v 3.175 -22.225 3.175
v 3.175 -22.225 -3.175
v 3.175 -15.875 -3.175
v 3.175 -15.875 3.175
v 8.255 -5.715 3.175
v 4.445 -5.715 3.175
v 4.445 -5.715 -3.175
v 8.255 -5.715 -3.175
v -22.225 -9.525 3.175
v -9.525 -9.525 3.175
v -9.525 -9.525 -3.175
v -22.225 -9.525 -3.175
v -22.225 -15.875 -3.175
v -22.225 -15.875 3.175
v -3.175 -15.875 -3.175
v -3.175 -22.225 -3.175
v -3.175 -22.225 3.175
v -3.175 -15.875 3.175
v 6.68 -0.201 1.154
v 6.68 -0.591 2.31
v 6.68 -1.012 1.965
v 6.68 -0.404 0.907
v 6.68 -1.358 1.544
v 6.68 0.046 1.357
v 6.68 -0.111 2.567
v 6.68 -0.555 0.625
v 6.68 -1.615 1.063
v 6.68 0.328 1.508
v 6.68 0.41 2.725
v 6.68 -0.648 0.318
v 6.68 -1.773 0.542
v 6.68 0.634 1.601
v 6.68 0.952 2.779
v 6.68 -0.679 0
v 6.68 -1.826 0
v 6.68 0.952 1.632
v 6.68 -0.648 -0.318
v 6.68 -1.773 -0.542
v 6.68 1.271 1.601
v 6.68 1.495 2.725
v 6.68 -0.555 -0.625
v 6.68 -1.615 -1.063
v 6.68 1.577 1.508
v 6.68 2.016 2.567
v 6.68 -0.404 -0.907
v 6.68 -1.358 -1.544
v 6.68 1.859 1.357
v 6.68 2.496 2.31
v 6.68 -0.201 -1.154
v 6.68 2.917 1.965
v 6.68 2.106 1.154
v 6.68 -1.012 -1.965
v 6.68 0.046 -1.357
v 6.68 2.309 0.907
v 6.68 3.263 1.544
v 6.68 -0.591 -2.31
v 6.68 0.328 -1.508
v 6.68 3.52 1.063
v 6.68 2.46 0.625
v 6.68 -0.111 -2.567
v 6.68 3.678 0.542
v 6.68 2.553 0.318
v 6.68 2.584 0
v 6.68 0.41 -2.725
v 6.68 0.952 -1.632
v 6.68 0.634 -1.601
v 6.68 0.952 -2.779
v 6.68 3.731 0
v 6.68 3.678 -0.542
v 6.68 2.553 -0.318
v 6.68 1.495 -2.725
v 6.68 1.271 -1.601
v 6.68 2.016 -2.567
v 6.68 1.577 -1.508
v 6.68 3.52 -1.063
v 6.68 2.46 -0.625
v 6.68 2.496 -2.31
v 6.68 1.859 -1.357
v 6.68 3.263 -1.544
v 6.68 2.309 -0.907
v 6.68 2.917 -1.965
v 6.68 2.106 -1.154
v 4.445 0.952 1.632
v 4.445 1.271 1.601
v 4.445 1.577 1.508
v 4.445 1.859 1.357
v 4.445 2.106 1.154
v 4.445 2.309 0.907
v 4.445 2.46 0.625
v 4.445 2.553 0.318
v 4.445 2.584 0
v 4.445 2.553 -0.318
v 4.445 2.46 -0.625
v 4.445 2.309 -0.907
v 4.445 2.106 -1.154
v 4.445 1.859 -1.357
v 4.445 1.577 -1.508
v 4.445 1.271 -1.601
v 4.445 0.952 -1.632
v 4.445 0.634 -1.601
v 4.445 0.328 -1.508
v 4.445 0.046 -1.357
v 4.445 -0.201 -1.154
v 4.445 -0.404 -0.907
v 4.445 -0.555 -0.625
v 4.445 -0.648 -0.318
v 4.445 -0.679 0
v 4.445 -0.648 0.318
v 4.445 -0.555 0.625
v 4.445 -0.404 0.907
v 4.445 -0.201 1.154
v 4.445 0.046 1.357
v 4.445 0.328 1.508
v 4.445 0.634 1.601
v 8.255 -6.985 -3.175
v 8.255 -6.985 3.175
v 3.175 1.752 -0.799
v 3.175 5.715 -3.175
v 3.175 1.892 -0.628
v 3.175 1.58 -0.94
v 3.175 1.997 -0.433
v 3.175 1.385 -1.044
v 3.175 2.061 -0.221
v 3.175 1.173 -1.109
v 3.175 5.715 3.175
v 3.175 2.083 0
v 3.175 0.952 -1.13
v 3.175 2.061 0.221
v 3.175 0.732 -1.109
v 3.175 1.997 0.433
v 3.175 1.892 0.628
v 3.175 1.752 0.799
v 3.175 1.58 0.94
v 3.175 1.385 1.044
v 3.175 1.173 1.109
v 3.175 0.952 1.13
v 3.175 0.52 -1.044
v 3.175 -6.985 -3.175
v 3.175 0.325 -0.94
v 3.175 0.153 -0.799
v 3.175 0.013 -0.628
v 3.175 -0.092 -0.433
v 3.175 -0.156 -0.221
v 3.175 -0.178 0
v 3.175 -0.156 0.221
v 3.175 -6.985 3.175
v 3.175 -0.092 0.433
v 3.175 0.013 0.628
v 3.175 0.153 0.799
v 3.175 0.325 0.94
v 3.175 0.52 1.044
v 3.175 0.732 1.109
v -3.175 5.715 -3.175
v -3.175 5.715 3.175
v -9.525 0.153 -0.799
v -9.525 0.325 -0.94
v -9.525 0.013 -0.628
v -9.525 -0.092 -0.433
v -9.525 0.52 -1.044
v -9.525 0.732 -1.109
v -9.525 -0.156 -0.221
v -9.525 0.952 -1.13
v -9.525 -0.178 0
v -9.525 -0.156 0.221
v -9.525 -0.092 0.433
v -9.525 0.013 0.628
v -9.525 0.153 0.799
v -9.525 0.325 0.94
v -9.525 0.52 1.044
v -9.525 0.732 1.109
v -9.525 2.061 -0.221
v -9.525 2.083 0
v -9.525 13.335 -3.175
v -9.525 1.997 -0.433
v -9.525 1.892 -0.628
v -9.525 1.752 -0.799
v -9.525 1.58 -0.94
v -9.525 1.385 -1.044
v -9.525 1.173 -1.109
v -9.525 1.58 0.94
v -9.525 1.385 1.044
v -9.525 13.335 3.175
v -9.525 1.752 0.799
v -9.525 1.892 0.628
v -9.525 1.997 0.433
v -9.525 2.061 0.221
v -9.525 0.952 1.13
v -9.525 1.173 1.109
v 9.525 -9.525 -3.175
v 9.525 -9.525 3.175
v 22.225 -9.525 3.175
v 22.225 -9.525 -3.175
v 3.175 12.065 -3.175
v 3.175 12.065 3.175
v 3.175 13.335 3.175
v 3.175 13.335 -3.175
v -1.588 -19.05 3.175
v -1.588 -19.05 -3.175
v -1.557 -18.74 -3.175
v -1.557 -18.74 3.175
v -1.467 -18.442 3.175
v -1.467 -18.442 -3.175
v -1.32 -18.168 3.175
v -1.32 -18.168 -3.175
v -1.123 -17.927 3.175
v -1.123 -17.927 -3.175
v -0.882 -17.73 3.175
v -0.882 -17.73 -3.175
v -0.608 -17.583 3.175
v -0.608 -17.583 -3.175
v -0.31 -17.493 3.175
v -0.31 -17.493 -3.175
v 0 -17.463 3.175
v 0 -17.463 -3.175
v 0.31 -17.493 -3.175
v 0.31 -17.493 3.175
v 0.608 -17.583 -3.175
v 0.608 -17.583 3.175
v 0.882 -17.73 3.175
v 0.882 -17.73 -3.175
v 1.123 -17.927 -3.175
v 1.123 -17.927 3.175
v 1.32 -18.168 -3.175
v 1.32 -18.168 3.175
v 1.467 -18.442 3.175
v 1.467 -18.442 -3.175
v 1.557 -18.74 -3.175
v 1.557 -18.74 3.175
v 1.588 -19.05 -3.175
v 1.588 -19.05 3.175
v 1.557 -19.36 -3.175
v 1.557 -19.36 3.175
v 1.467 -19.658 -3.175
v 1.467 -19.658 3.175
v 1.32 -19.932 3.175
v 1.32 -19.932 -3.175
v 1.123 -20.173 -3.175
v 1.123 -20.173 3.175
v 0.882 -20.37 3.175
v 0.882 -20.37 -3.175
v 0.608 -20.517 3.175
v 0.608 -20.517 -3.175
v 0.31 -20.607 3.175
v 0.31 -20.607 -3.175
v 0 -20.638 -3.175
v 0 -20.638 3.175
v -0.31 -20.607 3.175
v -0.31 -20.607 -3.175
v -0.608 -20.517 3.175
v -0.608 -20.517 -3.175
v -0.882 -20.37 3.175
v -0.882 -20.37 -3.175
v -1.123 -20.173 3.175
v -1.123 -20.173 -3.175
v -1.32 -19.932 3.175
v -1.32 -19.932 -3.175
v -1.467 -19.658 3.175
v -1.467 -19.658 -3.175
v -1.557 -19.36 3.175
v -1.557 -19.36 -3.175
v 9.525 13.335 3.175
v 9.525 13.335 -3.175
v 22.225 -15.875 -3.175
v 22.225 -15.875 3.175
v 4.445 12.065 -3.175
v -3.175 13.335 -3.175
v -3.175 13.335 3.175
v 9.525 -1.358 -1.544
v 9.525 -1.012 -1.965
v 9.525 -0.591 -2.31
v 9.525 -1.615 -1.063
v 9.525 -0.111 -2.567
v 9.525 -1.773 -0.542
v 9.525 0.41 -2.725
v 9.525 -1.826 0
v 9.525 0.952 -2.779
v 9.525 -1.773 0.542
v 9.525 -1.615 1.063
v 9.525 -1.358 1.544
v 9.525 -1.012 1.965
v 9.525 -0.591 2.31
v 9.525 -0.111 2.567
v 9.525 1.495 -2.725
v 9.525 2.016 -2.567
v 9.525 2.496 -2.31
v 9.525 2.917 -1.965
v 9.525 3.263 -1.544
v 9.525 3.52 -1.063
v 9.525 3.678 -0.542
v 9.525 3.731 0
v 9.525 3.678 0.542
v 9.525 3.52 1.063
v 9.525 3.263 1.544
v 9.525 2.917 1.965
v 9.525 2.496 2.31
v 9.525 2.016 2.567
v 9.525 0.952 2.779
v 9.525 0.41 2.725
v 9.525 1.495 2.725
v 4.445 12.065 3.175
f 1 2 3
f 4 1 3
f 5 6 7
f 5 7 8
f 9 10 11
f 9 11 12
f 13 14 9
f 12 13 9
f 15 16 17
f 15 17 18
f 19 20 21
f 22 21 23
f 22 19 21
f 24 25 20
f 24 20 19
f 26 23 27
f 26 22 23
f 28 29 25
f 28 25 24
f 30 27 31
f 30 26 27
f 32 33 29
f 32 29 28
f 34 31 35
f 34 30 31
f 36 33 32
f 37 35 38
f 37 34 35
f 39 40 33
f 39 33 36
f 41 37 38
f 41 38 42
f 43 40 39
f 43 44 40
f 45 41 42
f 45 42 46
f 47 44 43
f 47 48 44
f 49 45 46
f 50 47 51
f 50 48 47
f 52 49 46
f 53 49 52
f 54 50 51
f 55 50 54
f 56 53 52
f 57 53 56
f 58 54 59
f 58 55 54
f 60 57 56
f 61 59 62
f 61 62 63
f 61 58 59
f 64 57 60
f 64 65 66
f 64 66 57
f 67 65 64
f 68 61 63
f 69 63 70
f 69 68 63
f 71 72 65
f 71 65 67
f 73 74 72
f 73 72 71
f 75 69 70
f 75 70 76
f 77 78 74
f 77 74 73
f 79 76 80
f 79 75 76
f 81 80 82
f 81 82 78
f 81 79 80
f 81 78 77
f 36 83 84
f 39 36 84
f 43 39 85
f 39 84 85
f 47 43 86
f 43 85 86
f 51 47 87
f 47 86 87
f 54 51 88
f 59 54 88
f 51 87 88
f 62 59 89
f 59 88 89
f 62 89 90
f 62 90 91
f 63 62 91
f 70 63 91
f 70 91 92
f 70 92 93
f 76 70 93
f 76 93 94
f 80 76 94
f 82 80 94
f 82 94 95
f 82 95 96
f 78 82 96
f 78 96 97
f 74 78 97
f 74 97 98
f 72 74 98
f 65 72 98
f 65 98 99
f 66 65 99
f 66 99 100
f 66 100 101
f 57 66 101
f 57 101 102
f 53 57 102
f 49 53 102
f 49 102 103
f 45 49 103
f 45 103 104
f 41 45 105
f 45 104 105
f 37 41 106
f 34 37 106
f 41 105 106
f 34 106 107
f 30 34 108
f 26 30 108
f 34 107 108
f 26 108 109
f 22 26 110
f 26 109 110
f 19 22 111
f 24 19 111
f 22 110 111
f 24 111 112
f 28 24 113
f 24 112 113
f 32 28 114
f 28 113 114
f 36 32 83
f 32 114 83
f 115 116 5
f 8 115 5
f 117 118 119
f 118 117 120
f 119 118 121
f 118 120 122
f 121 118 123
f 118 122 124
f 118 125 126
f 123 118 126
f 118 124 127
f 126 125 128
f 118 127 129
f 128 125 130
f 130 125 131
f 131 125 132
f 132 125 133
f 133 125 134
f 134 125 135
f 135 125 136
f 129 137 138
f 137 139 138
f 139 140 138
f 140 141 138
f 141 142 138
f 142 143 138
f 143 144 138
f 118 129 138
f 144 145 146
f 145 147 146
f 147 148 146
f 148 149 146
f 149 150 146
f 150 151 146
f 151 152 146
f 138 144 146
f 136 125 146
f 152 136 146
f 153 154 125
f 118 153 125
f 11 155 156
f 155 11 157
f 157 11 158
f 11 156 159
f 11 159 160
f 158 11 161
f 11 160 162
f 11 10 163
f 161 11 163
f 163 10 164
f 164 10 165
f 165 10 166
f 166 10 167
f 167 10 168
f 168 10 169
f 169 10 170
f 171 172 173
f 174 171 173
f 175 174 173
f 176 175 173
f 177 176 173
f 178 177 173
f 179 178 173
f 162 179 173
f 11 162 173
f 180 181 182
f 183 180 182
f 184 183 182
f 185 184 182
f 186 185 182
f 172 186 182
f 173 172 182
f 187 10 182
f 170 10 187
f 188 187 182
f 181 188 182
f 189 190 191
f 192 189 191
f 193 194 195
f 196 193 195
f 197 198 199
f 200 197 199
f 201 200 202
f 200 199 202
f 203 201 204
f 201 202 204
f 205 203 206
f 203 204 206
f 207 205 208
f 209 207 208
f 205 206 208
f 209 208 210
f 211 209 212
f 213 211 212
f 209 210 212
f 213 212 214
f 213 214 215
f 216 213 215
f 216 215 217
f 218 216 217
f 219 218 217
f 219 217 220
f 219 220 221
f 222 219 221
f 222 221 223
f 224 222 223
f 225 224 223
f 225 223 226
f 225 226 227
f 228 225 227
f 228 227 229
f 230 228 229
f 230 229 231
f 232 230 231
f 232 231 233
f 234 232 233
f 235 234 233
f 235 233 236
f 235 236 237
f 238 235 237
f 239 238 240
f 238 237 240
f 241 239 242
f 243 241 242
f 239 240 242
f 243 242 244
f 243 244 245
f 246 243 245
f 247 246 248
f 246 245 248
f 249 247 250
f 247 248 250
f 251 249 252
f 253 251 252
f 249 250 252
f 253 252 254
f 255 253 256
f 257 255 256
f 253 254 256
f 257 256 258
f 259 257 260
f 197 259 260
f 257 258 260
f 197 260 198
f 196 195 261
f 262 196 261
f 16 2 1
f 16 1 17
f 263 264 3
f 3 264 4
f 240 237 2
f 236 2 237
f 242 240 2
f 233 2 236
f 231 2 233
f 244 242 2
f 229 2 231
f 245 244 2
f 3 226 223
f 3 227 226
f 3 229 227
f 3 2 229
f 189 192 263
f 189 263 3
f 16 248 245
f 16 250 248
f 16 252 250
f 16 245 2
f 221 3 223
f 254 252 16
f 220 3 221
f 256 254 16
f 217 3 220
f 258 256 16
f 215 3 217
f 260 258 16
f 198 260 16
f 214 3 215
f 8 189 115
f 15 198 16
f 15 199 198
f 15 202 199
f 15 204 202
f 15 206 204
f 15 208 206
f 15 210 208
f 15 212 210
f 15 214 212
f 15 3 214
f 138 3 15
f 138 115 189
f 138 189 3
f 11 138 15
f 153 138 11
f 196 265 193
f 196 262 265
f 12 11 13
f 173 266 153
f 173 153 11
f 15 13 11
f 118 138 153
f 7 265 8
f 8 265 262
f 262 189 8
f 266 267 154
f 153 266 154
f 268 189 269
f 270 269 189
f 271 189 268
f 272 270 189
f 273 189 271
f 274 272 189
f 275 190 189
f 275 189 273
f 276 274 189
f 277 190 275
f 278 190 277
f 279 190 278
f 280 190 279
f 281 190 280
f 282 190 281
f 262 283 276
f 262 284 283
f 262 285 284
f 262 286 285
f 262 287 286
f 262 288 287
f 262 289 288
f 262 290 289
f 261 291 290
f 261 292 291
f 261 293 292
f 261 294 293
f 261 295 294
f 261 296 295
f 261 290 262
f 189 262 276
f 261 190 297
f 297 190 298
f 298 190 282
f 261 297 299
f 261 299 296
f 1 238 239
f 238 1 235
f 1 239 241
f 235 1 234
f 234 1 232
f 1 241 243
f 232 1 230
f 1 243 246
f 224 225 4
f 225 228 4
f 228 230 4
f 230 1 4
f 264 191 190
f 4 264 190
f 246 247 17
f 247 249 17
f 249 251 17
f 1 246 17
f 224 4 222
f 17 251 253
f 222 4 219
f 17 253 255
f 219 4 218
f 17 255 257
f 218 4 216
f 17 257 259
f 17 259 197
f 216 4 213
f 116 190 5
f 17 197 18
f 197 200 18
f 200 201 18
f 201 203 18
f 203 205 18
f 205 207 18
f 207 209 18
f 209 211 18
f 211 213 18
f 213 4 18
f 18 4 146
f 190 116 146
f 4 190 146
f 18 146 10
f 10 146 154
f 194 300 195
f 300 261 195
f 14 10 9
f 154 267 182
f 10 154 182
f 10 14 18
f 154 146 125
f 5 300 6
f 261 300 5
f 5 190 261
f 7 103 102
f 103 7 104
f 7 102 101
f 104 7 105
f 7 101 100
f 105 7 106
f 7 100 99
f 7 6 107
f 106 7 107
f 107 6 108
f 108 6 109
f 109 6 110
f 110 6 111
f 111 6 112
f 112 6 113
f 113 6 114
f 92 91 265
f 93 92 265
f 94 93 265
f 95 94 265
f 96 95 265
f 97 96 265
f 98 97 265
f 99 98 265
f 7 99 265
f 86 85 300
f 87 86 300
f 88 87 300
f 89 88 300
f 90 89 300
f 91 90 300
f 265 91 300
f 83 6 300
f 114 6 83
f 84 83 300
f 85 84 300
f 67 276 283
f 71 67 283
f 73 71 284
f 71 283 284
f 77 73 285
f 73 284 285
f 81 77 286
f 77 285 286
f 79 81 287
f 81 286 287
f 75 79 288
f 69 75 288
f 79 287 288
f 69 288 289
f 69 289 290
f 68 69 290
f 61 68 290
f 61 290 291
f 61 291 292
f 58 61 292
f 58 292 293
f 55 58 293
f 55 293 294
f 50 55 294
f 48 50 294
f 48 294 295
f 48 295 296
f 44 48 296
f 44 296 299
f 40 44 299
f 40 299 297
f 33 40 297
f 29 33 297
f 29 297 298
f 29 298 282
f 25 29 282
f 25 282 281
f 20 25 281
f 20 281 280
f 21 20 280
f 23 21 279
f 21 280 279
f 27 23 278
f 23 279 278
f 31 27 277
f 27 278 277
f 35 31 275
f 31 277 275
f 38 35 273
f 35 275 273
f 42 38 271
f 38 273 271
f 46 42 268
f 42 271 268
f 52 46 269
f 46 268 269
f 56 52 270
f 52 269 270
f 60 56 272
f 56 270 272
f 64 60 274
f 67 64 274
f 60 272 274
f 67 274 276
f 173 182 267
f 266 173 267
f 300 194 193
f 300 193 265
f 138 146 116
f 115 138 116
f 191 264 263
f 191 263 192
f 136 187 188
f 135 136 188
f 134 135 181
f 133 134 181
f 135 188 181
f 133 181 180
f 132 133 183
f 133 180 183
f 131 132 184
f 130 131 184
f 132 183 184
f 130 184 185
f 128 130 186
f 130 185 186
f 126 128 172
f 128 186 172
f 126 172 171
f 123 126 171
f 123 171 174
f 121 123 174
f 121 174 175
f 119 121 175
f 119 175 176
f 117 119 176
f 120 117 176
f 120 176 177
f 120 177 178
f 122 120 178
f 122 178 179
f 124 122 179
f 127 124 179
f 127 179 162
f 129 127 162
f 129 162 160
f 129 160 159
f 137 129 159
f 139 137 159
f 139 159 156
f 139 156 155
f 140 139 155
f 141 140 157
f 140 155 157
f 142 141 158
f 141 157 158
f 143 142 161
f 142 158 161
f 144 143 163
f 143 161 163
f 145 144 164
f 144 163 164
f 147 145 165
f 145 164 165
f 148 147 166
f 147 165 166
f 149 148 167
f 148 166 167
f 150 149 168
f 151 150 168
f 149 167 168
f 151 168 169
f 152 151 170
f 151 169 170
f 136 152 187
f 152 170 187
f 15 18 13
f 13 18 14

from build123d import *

# Parameters (mm, degrees)
SKETCH2_W                                      = 19.05
SKETCH2_H                                      = 31.75
BOSS_EXTRUDE1_DEPTH                            = 3.175
CUT_EXTRUDE1_DEPTH                             = 23.857707289
SKETCH6_W                                      = 1.27
SKETCH6_H                                      = 17.78
SKETCH6_H_2                                    = 1.27
SKETCH6_W_2                                    = 3.81
CUT_EXTRUDE2_DEPTH                             = 23.857707289
CBORE_FOR_4_SOCKET_HEAD_CAP_SCREW1_D           = 3.2639
CBORE_FOR_4_SOCKET_HEAD_CAP_SCREW1_DEPTH       = 5.08
CBORE_FOR_4_SOCKET_HEAD_CAP_SCREW1_CBORE_D     = 5.55752
CBORE_FOR_4_SOCKET_HEAD_CAP_SCREW1_CBORE_DEPTH = 2.8448
F_4_40_TAPPED_HOLE1_D                          = 2.2606
SKETCH20_W                                     = 12.7
SKETCH20_H                                     = 6.35
BOSS_EXTRUDE2_DEPTH                            = 6.35
SKETCH21_W                                     = 6.35
SKETCH21_H                                     = 12.7
BOSS_EXTRUDE4_DEPTH                            = 6.35
SKETCH22_R                                     = 1.5875
CUT_EXTRUDE3_DEPTH                             = 33.065928179


with BuildPart() as part:
    # Sketch2 → Boss-Extrude1 (new, symmetric)
    with BuildSketch(Plane.XY):
        Rectangle(SKETCH2_W, SKETCH2_H)
    extrude(amount=BOSS_EXTRUDE1_DEPTH, both=True)

    # Sketch4 → Cut-Extrude1 (cut, through all)
    with BuildSketch(Plane(origin=(-1.506852909, 3.110534069, 3.175), x_dir=(1, 0, 0), z_dir=(0, 0, 1))):
        Polygon((-8.018147091, 12.764465931), (-8.018147091, 10.224465931), (-1.668147091, 10.224465931), (-1.668147091, 2.604465931), (4.681852909, 2.604465931), (4.681852909, 10.224465931), (11.031852909, 10.224465931), (11.031852909, 12.764465931), align=None)
    extrude(amount=-CUT_EXTRUDE1_DEPTH, mode=Mode.SUBTRACT)

    # Sketch6 → Cut-Extrude2 (cut, through all)
    with BuildSketch(Plane(origin=(-1.506852909, 3.110534069, 3.175), x_dir=(1, 0, 0), z_dir=(0, 0, 1))):
        with Locations((5.316852909, 0.064465931)):
            Rectangle(SKETCH6_W, SKETCH6_H)
        with Locations((5.316852909, -9.460534069)):
            Rectangle(SKETCH6_W, SKETCH6_H_2)
        with Locations((7.856852909, -9.460534069)):
            Rectangle(SKETCH6_W_2, SKETCH6_H_2)
    extrude(amount=-CUT_EXTRUDE2_DEPTH, mode=Mode.SUBTRACT)

    # CBORE for #4 Socket Head Cap Screw1
    with Locations(Plane(origin=(9.525, 0, 0), x_dir=(0, 0, -1), z_dir=(1, 0, 0))):
        with Locations((0, 0.9525)):
            CounterBoreHole(CBORE_FOR_4_SOCKET_HEAD_CAP_SCREW1_D / 2, CBORE_FOR_4_SOCKET_HEAD_CAP_SCREW1_CBORE_D / 2, CBORE_FOR_4_SOCKET_HEAD_CAP_SCREW1_CBORE_DEPTH, depth=CBORE_FOR_4_SOCKET_HEAD_CAP_SCREW1_DEPTH)

    # #4-40 Tapped Hole1 (through all)
    with Locations(Plane(origin=(3.175, 0, 0), x_dir=(0, 0, -1), z_dir=(1, 0, 0))):
        with Locations((0, 0.9525)):
            Hole(F_4_40_TAPPED_HOLE1_D / 2)

    # Sketch20 → Boss-Extrude2 (add, through all)
    with BuildSketch(Plane.XY.offset(3.175)):
        with Locations((15.875, -12.7)):
            Rectangle(SKETCH20_W, SKETCH20_H)
    boss_extrude2 = extrude(amount=-BOSS_EXTRUDE2_DEPTH)

    # Mirror1: Boss-Extrude2 across plane
    add(boss_extrude2.mirror(Plane(origin=(0, 0, 0), x_dir=(0, 0, 1), z_dir=(1, 0, 0))))

    # Sketch21 → Boss-Extrude4 (add, through all)
    with BuildSketch(Plane(origin=(0, 0, -3.175), x_dir=(-1, 0, 0), z_dir=(0, 0, -1))):
        with Locations((0, -15.875)):
            Rectangle(SKETCH21_W, SKETCH21_H)
    extrude(amount=-BOSS_EXTRUDE4_DEPTH)

    # Sketch22 → Cut-Extrude3 (cut, through all)
    with BuildSketch(Plane(origin=(0, 0, -3.175), x_dir=(-1, 0, 0), z_dir=(0, 0, -1))):
        with Locations((0, -19.05)):
            Circle(SKETCH22_R)
    extrude(amount=-CUT_EXTRUDE3_DEPTH, mode=Mode.SUBTRACT)


solid = part.part
